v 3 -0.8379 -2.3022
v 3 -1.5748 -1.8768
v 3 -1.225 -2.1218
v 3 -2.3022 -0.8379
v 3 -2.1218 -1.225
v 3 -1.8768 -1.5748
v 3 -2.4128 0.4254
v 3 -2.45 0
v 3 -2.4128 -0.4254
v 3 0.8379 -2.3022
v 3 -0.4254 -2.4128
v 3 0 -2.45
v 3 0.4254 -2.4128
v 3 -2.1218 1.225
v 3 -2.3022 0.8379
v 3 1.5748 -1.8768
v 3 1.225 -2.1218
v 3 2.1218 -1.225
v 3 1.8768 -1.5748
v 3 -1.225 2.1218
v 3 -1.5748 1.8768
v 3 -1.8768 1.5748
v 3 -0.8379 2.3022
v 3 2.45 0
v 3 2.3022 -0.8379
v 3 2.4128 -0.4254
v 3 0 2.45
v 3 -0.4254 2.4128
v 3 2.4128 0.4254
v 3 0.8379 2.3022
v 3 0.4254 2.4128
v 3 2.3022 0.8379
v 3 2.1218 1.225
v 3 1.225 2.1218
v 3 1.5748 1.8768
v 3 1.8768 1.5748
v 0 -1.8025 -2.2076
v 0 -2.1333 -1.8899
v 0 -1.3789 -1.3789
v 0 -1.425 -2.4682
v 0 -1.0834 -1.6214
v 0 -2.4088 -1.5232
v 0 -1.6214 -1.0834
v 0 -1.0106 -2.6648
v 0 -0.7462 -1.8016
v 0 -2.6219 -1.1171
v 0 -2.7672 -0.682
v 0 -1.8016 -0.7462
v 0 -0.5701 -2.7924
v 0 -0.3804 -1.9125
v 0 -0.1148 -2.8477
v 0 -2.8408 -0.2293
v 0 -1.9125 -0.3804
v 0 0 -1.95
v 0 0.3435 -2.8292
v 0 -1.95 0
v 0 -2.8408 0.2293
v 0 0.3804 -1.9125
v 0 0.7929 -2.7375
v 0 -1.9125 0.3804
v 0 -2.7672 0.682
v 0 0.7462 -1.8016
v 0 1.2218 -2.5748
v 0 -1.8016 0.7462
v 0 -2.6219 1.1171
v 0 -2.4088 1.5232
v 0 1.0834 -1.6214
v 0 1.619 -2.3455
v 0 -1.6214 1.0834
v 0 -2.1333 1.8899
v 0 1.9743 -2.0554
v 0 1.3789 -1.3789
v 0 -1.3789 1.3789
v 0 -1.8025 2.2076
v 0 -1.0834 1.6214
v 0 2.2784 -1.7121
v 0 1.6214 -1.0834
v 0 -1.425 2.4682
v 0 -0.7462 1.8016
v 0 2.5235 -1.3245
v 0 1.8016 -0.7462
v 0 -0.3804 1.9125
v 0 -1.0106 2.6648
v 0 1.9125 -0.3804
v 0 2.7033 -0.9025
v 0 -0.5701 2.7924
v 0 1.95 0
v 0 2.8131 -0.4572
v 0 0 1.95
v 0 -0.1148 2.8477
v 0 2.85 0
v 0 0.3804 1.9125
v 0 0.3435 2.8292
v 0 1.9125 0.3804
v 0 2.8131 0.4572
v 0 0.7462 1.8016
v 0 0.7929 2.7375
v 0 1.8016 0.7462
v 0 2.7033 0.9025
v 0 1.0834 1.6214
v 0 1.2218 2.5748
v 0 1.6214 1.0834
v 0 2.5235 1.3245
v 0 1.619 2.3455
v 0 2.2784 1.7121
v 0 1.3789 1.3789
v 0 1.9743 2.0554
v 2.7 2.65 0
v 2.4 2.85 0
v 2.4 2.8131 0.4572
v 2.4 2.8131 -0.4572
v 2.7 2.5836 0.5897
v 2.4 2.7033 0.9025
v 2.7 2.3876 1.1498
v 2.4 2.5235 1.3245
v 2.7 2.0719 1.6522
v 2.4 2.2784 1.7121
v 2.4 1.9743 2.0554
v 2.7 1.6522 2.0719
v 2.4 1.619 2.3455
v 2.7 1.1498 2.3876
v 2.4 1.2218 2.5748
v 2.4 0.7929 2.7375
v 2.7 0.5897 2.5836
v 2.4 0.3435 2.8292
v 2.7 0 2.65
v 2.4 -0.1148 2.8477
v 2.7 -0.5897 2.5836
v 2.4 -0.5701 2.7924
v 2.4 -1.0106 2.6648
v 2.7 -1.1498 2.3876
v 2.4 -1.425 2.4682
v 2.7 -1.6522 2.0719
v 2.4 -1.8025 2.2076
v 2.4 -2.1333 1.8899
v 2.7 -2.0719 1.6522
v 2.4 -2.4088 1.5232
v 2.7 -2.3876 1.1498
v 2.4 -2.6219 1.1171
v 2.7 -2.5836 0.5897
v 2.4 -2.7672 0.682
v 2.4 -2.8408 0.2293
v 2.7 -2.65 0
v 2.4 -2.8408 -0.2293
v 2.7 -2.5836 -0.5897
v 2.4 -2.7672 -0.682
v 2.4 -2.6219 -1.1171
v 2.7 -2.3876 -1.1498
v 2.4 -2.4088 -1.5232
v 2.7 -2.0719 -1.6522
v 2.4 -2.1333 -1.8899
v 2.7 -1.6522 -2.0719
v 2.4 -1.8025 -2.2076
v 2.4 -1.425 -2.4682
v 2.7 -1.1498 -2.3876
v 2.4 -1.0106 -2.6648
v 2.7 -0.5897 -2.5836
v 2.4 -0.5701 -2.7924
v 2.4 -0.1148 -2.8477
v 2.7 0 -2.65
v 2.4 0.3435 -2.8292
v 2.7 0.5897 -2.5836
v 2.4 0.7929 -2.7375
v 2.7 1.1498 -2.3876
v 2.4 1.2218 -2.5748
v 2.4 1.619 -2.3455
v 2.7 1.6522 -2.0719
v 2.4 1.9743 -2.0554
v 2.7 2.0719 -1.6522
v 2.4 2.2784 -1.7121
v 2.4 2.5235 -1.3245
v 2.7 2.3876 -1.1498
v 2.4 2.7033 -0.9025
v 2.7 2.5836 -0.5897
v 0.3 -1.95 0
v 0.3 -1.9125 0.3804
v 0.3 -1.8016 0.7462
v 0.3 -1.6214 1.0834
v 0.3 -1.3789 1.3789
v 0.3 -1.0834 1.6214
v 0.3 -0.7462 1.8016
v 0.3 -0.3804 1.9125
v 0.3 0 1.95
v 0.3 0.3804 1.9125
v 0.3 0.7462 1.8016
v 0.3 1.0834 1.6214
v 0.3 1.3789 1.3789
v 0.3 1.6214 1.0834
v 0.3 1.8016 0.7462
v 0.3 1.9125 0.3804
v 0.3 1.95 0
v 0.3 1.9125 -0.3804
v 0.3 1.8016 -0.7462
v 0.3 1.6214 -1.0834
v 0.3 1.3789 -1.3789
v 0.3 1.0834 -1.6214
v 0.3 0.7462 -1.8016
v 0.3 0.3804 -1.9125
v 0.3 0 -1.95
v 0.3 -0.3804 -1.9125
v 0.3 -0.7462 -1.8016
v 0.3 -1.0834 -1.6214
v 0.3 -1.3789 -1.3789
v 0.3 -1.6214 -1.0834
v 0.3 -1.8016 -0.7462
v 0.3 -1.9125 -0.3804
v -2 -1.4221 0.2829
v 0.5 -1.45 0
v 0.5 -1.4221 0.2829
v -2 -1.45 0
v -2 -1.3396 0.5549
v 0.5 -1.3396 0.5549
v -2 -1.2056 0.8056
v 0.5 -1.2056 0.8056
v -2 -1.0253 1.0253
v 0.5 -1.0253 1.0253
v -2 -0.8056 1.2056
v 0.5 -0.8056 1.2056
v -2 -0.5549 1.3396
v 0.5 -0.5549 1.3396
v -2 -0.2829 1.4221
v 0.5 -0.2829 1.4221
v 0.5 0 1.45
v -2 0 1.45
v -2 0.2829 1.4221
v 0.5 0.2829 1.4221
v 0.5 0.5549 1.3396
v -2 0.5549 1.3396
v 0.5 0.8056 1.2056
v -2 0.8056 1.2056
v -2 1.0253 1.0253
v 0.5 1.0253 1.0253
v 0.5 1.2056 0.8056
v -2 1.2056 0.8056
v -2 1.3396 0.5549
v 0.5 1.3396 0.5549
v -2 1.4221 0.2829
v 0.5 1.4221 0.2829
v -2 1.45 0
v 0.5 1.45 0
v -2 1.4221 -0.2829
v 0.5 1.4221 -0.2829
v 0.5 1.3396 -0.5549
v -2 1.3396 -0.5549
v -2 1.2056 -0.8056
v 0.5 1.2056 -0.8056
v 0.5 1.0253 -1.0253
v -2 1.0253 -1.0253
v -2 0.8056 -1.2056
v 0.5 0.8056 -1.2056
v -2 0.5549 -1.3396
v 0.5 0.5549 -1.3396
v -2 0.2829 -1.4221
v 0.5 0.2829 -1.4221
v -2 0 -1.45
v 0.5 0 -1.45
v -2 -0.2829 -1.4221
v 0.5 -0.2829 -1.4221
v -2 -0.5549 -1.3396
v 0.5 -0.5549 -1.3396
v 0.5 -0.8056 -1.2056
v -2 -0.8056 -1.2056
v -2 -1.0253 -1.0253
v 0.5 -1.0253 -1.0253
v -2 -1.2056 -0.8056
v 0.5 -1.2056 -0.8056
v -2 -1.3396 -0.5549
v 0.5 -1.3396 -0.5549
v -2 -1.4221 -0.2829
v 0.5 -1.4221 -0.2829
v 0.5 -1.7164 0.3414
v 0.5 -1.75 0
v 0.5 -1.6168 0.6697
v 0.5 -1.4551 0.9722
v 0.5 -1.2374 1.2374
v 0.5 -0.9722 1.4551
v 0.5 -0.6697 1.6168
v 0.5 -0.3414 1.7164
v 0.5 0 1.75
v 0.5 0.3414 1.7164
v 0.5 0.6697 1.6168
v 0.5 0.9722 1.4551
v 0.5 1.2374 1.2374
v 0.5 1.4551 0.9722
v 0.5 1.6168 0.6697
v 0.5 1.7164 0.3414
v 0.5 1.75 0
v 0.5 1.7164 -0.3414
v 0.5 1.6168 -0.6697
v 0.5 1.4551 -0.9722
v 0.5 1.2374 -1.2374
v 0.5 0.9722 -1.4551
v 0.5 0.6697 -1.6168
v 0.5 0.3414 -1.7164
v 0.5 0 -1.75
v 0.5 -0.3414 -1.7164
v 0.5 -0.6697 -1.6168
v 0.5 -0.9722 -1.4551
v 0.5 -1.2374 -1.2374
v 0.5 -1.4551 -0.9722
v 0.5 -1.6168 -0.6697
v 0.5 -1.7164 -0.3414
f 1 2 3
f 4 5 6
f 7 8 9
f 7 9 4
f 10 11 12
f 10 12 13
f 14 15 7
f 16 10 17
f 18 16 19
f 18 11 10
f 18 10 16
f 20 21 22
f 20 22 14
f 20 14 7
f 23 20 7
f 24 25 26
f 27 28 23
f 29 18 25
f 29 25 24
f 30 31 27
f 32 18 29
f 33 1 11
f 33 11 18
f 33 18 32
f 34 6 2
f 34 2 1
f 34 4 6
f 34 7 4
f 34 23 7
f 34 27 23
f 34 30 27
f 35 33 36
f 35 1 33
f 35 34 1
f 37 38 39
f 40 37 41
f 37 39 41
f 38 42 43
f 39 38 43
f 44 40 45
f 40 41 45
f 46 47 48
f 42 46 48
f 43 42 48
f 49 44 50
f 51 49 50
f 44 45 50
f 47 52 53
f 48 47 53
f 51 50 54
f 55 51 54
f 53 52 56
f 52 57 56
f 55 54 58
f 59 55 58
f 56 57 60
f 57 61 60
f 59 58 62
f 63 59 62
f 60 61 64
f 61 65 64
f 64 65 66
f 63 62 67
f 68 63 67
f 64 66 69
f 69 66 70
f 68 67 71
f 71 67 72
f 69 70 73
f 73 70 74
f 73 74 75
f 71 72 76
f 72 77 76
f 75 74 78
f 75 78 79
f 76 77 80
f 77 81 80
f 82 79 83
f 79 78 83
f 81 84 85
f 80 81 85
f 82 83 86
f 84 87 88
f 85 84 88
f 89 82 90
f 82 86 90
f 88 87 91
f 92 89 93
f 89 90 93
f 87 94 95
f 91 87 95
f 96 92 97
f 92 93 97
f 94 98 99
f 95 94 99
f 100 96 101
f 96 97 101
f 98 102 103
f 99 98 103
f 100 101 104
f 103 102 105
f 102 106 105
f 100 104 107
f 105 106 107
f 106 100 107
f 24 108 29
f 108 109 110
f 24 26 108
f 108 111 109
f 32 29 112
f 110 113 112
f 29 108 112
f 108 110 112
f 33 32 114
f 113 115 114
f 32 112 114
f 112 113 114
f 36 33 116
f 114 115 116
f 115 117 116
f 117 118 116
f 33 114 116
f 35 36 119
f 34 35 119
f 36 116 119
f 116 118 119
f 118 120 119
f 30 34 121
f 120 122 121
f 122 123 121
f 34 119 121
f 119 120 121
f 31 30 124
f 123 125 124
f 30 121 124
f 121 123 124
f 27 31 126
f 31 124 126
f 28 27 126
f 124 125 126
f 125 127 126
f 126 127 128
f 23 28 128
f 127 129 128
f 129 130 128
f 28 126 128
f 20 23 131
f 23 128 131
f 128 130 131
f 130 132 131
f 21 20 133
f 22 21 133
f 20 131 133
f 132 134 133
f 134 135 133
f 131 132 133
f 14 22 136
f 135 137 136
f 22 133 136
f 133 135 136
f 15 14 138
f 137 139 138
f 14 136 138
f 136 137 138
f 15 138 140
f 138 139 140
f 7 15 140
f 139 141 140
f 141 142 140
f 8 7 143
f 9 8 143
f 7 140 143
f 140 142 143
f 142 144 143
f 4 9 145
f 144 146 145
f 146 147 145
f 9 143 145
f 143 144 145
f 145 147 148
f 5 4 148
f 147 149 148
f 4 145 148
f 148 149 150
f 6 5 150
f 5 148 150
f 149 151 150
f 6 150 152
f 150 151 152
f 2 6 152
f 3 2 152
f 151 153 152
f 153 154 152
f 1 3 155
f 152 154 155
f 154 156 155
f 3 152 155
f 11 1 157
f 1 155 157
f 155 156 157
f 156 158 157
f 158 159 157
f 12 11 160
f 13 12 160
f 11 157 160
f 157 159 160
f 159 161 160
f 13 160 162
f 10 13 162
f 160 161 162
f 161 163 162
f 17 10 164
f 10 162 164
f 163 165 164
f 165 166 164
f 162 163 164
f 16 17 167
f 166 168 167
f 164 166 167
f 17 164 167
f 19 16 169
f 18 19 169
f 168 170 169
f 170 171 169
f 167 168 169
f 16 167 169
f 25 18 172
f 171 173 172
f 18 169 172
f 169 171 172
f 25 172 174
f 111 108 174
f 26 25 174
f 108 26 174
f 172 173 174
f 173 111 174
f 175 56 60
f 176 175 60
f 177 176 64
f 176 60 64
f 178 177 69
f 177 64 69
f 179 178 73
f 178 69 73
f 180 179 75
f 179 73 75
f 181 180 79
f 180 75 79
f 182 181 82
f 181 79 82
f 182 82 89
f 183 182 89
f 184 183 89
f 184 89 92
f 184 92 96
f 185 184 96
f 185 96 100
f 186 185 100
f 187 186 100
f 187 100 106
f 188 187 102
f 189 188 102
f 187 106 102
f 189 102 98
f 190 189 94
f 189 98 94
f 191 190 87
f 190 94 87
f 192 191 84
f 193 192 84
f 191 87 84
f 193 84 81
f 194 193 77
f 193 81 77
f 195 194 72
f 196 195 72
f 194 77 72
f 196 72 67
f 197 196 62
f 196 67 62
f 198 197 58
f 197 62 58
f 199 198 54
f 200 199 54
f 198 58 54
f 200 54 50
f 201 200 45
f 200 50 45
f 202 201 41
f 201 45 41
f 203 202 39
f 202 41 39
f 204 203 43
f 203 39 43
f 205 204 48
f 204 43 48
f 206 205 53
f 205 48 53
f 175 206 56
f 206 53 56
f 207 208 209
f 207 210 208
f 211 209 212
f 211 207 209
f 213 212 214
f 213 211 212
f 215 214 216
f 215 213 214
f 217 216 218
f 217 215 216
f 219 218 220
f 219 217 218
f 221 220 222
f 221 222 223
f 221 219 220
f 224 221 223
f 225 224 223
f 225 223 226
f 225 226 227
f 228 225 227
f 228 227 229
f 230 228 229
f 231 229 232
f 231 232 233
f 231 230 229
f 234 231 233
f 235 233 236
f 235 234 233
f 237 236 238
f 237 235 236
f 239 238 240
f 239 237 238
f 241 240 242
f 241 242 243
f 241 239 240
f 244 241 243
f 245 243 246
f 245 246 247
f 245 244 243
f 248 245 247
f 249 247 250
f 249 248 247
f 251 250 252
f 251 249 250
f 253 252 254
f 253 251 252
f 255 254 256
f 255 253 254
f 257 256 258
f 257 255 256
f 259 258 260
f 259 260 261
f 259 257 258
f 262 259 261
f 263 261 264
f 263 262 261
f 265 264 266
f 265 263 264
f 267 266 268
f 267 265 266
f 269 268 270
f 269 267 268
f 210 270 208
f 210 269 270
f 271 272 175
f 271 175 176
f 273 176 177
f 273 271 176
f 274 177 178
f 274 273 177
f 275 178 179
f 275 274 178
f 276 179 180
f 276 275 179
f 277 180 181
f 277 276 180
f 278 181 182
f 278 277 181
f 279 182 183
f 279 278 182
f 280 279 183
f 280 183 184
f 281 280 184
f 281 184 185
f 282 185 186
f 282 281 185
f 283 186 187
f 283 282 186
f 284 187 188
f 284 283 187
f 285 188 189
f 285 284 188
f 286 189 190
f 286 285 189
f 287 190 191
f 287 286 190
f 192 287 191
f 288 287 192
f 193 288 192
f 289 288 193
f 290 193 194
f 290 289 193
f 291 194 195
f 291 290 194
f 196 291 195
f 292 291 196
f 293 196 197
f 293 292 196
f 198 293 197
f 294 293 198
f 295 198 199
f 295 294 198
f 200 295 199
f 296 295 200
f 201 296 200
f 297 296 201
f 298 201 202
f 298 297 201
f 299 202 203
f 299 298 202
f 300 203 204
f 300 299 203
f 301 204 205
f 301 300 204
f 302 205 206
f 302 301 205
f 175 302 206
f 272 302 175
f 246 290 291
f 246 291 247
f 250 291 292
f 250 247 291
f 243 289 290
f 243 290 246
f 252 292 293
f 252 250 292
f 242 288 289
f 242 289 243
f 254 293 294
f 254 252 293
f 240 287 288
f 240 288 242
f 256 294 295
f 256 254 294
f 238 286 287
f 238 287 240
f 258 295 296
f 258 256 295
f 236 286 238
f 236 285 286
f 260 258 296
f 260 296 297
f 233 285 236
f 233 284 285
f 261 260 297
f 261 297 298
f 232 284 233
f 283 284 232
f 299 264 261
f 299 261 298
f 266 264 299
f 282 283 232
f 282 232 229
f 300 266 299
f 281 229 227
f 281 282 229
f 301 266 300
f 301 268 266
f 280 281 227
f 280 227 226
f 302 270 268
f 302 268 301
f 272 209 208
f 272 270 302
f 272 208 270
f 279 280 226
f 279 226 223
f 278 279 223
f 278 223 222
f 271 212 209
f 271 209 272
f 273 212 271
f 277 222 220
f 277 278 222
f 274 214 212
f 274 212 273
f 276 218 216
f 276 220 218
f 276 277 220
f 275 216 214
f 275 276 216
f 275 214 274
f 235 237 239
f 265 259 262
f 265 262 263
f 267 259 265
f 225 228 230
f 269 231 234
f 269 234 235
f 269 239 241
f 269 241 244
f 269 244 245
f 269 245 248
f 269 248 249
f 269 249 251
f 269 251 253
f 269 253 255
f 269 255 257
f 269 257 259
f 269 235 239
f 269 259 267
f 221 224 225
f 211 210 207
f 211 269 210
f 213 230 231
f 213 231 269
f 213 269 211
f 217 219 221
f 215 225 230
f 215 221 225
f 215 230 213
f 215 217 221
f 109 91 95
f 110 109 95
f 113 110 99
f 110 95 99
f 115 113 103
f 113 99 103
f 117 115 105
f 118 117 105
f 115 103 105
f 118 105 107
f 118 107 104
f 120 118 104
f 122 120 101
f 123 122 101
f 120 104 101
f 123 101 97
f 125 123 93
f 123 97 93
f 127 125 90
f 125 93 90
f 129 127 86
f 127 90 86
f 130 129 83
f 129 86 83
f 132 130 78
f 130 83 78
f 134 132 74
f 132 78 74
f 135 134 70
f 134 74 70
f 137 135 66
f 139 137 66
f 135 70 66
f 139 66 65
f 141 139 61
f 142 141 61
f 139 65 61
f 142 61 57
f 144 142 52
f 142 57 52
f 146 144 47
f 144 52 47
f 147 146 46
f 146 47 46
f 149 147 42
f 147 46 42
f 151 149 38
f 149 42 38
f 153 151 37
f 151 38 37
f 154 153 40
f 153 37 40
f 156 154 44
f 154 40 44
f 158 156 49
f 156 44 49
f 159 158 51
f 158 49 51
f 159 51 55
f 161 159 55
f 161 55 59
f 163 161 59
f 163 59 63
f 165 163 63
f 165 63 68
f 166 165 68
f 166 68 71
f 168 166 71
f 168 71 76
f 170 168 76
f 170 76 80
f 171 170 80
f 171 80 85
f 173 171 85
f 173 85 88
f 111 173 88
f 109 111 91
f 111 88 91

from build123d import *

# Parameters (mm, degrees)
F0_R     = 2.85
F1_DEPTH = 3
F2_SIZE2 = 0.6
F2_SIZE  = 0.4
F3_R     = 1.45
F4_DEPTH = 2
F5_R     = 1.95
F5_R_2   = 1.45
F6_DEPTH = 0.5
F7_SIZE  = 0.2


with BuildPart() as f1:
    # F0 (on Right) → F1 (new body)
    with BuildSketch(Plane.YZ):
        Circle(F0_R)
    extrude(amount=F1_DEPTH)

    # F2
    f2_edges = [f1.edges().sort_by_distance(p)[0] for p in [
        (3, -2.85, 0),
    ]]
    f2_side = f1.faces().sort_by_distance((3, 0, 0))[0]
    chamfer(f2_edges, length=F2_SIZE, length2=F2_SIZE2, reference=f2_side)

    # F3 (on face) → F4 (join)
    with BuildSketch(Plane(origin=(0, 0, 0), x_dir=(0, -1, 0), z_dir=(-1, 0, 0))):
        Circle(F3_R)
    extrude(amount=F4_DEPTH)

    # F5 (on face) → F6 (cut)
    with BuildSketch(Plane(origin=(0, 0, 0), x_dir=(0, -1, 0), z_dir=(-1, 0, 0))):
        Circle(F5_R)
        Circle(F5_R_2, mode=Mode.SUBTRACT)
    extrude(amount=-F6_DEPTH, mode=Mode.SUBTRACT)

    # F7
    f7_edges = [f1.edges().sort_by_distance(p)[0] for p in [
        (0.5, 1.95, 0),
    ]]
    chamfer(f7_edges, length=F7_SIZE)


solid = f1.part
